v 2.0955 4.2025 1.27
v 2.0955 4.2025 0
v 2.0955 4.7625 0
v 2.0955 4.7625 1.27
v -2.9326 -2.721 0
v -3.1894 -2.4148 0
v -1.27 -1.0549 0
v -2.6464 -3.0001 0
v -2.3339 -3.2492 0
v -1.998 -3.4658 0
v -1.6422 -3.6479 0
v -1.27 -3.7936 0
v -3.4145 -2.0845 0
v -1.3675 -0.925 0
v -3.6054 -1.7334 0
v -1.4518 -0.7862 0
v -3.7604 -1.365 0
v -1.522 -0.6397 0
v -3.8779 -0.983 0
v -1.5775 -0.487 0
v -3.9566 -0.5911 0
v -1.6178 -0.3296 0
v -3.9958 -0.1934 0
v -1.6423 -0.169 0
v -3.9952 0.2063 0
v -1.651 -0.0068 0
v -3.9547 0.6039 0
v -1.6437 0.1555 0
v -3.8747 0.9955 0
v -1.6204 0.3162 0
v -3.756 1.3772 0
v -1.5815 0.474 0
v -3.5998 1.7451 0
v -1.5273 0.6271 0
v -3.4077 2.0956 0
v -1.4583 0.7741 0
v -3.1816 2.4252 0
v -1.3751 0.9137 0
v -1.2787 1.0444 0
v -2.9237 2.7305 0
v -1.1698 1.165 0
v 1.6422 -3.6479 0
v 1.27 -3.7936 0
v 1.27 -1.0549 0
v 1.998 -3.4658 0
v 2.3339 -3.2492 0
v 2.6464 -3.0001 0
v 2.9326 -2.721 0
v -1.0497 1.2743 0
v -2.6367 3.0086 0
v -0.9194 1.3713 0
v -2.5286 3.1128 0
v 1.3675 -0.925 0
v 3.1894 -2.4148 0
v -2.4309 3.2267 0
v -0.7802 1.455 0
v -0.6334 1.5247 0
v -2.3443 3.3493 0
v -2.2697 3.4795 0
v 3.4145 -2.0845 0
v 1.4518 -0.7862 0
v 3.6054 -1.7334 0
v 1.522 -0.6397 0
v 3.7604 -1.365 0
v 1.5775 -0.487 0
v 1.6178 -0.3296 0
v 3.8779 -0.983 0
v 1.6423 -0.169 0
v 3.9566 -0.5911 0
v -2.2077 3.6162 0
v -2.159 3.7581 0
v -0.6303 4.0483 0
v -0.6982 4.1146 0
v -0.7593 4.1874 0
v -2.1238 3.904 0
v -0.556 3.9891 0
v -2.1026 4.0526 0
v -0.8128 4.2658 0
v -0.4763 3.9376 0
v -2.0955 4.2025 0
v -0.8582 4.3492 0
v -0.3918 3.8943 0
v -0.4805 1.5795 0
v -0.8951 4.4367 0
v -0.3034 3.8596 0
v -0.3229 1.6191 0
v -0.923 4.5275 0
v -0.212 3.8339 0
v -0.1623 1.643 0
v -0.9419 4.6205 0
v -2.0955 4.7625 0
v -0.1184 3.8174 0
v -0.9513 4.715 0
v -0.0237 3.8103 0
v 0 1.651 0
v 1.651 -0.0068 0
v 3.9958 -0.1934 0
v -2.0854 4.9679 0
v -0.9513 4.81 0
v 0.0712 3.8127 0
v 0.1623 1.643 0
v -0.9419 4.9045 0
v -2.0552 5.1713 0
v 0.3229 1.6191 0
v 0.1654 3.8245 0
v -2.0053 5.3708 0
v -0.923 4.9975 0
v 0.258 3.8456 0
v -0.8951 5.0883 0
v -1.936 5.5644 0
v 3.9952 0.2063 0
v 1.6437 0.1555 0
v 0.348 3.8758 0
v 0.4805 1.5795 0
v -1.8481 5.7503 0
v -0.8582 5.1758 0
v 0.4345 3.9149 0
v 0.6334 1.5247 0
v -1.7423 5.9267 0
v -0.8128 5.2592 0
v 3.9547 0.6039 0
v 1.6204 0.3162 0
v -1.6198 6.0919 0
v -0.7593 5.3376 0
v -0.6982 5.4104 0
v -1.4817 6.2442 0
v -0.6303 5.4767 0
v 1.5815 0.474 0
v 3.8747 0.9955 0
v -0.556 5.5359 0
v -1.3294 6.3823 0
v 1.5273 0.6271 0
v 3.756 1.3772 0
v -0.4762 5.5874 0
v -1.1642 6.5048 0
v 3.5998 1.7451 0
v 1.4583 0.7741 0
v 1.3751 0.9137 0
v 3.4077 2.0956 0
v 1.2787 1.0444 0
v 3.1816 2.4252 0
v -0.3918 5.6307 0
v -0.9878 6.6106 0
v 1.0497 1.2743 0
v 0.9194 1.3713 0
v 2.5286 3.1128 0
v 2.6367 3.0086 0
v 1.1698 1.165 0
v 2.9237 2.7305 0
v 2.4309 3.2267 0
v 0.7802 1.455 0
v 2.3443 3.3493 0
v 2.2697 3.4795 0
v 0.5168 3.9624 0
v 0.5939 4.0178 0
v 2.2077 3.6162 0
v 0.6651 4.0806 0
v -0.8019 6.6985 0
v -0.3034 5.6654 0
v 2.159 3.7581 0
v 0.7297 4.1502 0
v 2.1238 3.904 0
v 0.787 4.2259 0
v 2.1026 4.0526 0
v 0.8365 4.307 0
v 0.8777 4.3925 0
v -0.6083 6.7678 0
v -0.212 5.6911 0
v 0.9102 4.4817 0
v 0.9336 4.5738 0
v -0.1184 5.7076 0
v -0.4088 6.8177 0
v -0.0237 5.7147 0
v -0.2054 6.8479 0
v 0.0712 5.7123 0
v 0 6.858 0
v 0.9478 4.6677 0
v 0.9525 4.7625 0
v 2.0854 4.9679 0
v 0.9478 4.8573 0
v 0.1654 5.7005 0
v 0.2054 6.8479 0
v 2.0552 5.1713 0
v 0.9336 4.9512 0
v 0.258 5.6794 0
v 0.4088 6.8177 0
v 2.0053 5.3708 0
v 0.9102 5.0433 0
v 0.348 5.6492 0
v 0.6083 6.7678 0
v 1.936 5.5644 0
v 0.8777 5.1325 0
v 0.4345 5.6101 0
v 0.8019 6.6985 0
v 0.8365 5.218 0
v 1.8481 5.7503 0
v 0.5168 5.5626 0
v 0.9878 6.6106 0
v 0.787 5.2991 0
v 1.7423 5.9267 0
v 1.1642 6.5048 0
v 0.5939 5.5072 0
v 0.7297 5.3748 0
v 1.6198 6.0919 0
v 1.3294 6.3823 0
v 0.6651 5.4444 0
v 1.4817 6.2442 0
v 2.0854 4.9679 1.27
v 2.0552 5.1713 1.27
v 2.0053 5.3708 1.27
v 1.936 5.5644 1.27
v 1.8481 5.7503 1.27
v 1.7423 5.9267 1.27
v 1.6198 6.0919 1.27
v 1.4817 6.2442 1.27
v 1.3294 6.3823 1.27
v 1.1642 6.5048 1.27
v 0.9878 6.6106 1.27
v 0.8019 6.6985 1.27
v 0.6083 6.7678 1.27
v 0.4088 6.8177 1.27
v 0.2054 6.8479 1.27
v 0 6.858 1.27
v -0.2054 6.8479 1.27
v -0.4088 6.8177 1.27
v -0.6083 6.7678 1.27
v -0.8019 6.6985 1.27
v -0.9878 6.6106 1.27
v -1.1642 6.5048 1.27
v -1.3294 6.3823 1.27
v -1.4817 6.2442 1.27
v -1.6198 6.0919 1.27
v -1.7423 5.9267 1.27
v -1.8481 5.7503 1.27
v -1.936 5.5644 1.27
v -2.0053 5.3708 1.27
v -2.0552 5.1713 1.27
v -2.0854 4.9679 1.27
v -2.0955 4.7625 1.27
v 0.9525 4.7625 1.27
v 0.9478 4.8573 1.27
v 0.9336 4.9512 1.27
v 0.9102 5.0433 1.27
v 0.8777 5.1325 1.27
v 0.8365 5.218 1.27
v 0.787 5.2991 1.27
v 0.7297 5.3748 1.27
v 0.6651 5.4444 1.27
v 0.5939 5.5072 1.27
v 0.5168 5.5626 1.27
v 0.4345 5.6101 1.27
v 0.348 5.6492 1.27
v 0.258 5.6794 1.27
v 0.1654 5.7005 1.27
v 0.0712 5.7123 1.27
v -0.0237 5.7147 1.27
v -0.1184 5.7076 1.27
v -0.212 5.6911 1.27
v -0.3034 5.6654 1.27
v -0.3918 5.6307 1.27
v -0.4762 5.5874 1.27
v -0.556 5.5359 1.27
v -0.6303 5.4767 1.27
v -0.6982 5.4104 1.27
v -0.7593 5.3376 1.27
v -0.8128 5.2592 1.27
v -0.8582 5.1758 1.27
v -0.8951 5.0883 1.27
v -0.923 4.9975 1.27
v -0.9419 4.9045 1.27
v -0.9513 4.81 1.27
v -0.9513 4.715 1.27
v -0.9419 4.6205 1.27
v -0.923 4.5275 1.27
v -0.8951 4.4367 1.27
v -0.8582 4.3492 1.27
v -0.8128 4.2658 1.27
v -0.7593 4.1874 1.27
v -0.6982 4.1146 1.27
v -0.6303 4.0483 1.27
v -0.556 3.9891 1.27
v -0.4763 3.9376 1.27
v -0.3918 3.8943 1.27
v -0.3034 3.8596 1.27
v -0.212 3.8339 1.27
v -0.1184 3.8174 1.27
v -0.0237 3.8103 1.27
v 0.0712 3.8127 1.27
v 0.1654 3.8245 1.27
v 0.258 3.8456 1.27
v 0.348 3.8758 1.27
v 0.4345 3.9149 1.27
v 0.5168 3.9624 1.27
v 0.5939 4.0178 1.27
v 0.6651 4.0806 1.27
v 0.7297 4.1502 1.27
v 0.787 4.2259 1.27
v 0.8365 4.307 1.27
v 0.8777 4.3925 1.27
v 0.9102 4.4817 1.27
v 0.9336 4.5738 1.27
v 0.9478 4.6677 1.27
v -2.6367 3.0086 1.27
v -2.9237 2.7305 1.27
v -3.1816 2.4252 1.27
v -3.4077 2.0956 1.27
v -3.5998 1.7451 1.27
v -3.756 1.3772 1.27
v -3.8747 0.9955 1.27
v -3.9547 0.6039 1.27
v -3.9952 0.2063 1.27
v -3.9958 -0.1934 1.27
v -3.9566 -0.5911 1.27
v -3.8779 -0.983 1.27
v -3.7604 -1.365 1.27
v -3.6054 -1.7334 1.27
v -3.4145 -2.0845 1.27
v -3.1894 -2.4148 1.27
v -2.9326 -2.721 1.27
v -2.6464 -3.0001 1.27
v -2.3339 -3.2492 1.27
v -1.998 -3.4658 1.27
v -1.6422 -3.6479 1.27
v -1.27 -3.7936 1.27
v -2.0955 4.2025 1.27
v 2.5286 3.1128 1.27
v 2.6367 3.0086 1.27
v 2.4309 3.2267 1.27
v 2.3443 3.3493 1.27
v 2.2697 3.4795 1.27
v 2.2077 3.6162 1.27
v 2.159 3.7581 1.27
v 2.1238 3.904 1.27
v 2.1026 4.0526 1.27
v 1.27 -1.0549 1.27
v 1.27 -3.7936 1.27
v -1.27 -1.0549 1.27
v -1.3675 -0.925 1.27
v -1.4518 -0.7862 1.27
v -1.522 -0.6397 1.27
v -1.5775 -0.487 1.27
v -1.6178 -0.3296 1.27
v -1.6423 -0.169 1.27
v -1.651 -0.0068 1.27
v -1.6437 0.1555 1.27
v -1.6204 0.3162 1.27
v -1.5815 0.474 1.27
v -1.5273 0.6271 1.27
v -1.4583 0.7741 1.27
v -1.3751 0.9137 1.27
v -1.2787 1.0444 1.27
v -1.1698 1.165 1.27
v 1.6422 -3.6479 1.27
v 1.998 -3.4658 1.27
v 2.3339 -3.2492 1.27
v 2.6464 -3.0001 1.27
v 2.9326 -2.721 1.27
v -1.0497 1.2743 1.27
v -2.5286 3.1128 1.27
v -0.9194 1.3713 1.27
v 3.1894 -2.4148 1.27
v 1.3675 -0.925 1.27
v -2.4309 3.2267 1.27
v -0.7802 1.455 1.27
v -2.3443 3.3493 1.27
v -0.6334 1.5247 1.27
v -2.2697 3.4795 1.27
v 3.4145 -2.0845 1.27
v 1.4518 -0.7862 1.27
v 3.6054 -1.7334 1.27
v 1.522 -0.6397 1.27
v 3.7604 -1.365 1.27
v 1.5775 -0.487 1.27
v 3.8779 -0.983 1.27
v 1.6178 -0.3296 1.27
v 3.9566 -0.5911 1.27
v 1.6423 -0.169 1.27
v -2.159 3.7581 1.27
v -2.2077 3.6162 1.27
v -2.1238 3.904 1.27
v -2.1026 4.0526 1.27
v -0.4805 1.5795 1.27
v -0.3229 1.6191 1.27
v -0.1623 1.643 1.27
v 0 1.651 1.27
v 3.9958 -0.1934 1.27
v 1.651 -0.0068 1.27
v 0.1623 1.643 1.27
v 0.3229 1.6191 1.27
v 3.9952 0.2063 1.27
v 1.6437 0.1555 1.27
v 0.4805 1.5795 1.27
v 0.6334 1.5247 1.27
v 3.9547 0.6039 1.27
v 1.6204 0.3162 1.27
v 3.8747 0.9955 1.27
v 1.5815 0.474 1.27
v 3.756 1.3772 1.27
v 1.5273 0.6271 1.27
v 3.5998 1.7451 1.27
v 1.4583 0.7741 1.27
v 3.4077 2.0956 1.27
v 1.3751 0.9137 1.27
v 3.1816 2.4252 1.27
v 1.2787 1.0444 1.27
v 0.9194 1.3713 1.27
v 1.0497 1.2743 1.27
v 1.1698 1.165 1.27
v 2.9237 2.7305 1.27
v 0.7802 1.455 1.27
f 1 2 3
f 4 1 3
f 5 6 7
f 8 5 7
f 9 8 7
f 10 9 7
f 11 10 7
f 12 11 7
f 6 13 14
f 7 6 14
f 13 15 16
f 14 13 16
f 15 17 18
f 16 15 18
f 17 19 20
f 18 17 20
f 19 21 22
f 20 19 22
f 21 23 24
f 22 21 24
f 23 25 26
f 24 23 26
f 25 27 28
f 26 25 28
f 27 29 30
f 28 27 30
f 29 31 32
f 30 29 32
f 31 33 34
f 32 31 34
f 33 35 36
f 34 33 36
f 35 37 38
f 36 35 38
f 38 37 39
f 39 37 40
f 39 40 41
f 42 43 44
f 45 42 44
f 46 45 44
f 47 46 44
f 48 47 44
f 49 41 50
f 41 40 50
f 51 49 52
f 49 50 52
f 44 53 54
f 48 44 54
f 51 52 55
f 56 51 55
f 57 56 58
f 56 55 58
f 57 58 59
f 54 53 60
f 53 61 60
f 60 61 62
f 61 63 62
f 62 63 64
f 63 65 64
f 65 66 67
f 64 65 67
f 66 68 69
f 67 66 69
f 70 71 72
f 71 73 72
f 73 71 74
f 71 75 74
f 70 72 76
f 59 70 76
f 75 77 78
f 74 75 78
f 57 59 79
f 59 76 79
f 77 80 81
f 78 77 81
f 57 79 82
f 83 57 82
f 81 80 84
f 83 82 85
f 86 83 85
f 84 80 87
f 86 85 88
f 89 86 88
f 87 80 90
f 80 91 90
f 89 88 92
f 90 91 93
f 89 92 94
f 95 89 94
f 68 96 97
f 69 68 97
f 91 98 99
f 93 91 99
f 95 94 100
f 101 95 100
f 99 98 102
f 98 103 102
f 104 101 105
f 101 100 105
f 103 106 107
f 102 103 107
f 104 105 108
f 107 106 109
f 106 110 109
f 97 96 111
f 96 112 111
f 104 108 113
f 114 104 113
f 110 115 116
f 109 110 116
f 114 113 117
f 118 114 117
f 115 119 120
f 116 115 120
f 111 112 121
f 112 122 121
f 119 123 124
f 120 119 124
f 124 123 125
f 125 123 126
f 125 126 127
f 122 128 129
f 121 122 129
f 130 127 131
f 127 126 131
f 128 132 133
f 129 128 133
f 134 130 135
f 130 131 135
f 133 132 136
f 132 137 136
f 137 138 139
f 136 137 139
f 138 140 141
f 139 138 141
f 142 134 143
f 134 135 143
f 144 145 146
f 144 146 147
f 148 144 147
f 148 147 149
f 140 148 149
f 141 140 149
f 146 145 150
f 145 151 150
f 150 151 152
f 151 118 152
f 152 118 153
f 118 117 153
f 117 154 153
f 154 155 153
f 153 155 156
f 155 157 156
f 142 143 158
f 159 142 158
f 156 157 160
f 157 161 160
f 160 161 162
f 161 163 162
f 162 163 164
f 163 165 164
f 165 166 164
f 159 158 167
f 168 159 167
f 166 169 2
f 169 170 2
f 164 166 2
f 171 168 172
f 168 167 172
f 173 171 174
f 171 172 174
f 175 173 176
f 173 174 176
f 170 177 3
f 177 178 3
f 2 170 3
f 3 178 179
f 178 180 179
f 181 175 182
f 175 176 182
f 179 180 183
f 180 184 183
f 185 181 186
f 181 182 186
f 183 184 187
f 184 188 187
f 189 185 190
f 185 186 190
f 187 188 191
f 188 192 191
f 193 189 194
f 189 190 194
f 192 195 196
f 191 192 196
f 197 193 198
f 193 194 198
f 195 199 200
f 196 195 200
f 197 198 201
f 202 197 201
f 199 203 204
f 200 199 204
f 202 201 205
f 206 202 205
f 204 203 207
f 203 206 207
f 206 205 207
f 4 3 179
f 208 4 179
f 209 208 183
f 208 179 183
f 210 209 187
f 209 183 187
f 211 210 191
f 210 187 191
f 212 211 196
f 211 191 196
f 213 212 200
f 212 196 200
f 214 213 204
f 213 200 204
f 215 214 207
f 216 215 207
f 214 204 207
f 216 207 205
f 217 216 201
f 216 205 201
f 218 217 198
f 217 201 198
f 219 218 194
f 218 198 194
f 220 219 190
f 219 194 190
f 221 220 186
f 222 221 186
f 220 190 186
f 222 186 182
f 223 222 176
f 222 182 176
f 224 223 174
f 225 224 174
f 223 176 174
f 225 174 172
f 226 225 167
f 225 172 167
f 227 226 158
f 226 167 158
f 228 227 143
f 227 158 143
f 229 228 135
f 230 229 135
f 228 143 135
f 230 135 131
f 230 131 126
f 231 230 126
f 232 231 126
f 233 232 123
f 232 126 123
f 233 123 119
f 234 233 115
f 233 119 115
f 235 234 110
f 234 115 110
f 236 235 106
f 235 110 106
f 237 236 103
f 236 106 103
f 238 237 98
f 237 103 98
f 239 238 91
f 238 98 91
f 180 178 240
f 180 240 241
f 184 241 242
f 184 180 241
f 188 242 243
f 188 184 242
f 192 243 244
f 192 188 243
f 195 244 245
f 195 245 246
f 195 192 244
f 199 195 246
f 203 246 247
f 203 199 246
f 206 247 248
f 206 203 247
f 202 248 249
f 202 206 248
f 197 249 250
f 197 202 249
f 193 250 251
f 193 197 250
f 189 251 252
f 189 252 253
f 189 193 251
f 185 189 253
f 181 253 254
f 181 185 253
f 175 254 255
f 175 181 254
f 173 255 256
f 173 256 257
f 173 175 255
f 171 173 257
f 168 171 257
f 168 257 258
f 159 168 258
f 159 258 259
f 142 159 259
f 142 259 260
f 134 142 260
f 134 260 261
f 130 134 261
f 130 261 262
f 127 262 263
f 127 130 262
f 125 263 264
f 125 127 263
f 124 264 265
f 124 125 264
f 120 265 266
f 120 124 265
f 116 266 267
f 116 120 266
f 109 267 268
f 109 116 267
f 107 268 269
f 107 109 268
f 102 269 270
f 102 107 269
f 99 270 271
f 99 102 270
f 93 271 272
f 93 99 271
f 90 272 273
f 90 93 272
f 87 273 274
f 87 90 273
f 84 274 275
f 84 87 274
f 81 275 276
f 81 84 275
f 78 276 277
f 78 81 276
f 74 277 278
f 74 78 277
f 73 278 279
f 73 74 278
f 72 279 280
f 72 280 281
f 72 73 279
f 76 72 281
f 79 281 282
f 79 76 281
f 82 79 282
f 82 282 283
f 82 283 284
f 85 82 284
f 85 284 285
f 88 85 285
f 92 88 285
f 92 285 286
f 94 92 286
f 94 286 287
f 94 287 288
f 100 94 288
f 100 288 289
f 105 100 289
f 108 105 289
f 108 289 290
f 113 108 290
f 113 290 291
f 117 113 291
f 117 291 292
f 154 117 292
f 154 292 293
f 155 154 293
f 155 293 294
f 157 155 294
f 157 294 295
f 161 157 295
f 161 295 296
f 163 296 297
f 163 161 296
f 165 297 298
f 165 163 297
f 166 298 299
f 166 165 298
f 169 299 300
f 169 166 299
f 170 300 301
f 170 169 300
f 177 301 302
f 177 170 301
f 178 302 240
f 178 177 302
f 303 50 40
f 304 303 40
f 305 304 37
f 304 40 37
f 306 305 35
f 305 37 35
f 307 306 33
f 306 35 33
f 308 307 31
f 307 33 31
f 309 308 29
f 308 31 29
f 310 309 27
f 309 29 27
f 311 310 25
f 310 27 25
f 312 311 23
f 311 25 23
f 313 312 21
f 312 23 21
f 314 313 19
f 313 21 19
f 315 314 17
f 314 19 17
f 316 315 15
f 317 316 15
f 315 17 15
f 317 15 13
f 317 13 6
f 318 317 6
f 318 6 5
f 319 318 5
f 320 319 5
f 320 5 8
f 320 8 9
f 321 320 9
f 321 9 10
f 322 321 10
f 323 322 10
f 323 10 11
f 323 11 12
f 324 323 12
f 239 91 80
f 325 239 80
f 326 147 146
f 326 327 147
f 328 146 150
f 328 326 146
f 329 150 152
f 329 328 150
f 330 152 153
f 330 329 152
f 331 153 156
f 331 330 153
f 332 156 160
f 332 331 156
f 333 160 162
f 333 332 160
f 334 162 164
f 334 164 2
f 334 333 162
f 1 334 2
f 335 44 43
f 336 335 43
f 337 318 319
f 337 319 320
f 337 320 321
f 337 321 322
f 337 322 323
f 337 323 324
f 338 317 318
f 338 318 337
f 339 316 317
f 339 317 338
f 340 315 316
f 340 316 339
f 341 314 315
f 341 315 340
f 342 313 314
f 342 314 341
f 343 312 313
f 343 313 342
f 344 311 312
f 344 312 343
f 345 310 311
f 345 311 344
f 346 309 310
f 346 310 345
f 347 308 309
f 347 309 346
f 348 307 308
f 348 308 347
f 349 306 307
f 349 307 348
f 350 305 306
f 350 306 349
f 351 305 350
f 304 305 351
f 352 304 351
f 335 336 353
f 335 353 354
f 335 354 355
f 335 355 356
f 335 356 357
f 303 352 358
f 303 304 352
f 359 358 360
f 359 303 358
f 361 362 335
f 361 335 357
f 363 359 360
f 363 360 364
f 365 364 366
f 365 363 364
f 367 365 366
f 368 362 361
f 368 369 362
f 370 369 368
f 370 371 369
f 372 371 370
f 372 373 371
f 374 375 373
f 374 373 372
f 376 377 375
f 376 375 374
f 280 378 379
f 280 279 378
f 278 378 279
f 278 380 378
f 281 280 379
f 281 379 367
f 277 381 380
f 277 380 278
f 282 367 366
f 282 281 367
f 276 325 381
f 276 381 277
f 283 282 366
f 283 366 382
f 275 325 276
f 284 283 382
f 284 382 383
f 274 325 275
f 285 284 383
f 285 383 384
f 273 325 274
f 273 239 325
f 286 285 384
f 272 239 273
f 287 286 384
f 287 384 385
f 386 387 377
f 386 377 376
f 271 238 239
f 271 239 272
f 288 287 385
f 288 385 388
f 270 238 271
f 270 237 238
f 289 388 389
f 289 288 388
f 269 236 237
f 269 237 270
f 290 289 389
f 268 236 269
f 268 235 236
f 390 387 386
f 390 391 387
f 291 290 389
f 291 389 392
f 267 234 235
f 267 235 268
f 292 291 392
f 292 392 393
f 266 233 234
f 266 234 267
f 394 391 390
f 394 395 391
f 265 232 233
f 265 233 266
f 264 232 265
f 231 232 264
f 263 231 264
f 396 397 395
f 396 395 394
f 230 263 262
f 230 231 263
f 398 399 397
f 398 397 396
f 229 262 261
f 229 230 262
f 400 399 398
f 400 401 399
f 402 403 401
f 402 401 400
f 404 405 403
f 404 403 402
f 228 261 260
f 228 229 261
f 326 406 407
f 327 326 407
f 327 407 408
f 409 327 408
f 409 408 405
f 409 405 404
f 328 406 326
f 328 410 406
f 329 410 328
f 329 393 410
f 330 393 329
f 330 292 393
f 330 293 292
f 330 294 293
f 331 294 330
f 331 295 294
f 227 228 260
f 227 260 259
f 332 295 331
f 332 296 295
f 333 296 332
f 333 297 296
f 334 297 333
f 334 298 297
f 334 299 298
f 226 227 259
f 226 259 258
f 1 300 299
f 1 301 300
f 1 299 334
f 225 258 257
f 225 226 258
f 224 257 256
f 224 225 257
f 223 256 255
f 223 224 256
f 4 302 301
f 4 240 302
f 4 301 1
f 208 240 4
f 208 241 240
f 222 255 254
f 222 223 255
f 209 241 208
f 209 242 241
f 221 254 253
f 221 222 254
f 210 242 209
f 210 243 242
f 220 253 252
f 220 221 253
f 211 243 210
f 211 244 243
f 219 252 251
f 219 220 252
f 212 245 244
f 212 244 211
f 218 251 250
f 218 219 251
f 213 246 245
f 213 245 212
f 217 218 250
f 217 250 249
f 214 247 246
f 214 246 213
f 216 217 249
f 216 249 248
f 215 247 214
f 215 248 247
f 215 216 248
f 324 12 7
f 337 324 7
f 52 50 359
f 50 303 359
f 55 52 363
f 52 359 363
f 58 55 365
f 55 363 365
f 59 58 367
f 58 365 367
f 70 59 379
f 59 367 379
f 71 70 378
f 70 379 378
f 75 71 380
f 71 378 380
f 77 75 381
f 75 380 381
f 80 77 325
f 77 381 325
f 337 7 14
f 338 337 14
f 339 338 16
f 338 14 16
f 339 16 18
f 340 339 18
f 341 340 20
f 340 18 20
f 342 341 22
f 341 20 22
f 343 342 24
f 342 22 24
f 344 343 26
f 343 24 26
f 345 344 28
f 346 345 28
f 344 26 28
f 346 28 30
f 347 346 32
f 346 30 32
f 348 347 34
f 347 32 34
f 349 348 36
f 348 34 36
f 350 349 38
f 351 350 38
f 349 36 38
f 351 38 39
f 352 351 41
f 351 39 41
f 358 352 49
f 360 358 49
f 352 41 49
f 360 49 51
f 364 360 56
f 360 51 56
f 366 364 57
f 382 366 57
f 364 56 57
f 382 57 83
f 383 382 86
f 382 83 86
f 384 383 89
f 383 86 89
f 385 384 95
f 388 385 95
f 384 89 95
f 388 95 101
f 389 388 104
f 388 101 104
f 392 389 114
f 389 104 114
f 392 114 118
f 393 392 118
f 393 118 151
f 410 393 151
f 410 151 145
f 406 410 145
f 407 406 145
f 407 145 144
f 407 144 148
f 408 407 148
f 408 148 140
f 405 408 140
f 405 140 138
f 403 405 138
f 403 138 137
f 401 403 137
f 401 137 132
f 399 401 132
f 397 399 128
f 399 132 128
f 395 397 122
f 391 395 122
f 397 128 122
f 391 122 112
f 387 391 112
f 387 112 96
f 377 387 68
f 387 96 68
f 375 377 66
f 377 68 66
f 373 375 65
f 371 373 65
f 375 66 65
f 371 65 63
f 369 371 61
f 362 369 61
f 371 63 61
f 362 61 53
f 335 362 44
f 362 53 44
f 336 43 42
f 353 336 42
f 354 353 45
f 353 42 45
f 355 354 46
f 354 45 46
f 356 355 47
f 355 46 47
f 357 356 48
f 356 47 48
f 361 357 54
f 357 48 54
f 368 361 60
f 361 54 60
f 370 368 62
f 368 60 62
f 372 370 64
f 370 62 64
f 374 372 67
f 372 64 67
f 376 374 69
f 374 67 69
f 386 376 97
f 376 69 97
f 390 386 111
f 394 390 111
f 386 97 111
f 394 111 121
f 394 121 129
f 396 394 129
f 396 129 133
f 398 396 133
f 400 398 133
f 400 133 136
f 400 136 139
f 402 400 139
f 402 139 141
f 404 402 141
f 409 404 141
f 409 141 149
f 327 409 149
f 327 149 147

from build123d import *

# Parameters (mm, degrees)
SKETCH1_R           = 0.9525
BOSS_EXTRUDE1_DEPTH = 1.27
FILLET1_R           = 1.5875


with BuildPart() as part:
    # Sketch1 → Boss-Extrude1 (new body)
    with BuildSketch(Plane.XY):
        with BuildLine():
            Line((-1.27, -3.793560366), (-1.27, -1.054941231))
            ThreePointArc((-1.27, -1.054941231), (0, 1.651), (1.27, -1.054941231))
            Line((1.27, -1.054941231), (1.27, -3.793560366))
            ThreePointArc((1.27, -3.793560366), (3.974472125, -0.455600239), (2.0955, 3.407767598))
            Line((2.0955, 3.407767598), (2.0955, 4.7625))
            ThreePointArc((2.0955, 4.7625), (0, 6.858), (-2.0955, 4.7625))
            Line((-2.0955, 4.7625), (-2.0955, 3.407767598))
            ThreePointArc((-2.0955, 3.407767598), (-3.974472125, -0.455600239), (-1.27, -3.793560366))
        make_face()
        with Locations((0, 4.7625)):
            Circle(SKETCH1_R, mode=Mode.SUBTRACT)
    extrude(amount=BOSS_EXTRUDE1_DEPTH)

    # Fillet1
    fillet1_edges = [part.edges().sort_by_distance(p)[0] for p in [
        (-2.0955, 3.407767598, 0.635),
        (2.0955, 3.407767598, 0.635),
    ]]
    fillet(fillet1_edges, radius=FILLET1_R)


solid = part.part
